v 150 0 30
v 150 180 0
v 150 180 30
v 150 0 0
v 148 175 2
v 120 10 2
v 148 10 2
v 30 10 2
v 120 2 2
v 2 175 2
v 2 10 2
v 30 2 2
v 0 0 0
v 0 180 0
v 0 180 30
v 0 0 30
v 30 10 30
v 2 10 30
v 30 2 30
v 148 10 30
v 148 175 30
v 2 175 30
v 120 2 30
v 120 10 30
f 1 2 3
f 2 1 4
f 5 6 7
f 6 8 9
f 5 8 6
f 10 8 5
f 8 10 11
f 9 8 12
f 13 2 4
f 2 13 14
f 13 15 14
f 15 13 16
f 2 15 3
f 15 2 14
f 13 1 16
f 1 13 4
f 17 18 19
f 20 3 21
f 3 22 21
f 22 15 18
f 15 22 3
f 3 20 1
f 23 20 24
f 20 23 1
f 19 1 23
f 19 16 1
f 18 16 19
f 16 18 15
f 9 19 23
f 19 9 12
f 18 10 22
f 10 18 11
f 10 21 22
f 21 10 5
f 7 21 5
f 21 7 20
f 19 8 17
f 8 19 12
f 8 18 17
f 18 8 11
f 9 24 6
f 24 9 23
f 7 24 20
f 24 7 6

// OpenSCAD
module box_game_base() {
    // Base
    translate([0,0,0]) cube([150, 180, 2]);
 
    //Walls
    translate([0,0,0]) cube([150, 2, 30]);
    translate([0,0,0]) cube([2, 180, 30]);
    translate([0,175,0]) cube([150, 5, 30]);
    translate([148,0,0]) cube([2, 180, 30]);
    
    // Boundary boxes
    translate([0,0,0]) cube([30, 10, 30]);
    translate([120,0,0]) cube([30, 10, 30]);
}

box_game_base();
